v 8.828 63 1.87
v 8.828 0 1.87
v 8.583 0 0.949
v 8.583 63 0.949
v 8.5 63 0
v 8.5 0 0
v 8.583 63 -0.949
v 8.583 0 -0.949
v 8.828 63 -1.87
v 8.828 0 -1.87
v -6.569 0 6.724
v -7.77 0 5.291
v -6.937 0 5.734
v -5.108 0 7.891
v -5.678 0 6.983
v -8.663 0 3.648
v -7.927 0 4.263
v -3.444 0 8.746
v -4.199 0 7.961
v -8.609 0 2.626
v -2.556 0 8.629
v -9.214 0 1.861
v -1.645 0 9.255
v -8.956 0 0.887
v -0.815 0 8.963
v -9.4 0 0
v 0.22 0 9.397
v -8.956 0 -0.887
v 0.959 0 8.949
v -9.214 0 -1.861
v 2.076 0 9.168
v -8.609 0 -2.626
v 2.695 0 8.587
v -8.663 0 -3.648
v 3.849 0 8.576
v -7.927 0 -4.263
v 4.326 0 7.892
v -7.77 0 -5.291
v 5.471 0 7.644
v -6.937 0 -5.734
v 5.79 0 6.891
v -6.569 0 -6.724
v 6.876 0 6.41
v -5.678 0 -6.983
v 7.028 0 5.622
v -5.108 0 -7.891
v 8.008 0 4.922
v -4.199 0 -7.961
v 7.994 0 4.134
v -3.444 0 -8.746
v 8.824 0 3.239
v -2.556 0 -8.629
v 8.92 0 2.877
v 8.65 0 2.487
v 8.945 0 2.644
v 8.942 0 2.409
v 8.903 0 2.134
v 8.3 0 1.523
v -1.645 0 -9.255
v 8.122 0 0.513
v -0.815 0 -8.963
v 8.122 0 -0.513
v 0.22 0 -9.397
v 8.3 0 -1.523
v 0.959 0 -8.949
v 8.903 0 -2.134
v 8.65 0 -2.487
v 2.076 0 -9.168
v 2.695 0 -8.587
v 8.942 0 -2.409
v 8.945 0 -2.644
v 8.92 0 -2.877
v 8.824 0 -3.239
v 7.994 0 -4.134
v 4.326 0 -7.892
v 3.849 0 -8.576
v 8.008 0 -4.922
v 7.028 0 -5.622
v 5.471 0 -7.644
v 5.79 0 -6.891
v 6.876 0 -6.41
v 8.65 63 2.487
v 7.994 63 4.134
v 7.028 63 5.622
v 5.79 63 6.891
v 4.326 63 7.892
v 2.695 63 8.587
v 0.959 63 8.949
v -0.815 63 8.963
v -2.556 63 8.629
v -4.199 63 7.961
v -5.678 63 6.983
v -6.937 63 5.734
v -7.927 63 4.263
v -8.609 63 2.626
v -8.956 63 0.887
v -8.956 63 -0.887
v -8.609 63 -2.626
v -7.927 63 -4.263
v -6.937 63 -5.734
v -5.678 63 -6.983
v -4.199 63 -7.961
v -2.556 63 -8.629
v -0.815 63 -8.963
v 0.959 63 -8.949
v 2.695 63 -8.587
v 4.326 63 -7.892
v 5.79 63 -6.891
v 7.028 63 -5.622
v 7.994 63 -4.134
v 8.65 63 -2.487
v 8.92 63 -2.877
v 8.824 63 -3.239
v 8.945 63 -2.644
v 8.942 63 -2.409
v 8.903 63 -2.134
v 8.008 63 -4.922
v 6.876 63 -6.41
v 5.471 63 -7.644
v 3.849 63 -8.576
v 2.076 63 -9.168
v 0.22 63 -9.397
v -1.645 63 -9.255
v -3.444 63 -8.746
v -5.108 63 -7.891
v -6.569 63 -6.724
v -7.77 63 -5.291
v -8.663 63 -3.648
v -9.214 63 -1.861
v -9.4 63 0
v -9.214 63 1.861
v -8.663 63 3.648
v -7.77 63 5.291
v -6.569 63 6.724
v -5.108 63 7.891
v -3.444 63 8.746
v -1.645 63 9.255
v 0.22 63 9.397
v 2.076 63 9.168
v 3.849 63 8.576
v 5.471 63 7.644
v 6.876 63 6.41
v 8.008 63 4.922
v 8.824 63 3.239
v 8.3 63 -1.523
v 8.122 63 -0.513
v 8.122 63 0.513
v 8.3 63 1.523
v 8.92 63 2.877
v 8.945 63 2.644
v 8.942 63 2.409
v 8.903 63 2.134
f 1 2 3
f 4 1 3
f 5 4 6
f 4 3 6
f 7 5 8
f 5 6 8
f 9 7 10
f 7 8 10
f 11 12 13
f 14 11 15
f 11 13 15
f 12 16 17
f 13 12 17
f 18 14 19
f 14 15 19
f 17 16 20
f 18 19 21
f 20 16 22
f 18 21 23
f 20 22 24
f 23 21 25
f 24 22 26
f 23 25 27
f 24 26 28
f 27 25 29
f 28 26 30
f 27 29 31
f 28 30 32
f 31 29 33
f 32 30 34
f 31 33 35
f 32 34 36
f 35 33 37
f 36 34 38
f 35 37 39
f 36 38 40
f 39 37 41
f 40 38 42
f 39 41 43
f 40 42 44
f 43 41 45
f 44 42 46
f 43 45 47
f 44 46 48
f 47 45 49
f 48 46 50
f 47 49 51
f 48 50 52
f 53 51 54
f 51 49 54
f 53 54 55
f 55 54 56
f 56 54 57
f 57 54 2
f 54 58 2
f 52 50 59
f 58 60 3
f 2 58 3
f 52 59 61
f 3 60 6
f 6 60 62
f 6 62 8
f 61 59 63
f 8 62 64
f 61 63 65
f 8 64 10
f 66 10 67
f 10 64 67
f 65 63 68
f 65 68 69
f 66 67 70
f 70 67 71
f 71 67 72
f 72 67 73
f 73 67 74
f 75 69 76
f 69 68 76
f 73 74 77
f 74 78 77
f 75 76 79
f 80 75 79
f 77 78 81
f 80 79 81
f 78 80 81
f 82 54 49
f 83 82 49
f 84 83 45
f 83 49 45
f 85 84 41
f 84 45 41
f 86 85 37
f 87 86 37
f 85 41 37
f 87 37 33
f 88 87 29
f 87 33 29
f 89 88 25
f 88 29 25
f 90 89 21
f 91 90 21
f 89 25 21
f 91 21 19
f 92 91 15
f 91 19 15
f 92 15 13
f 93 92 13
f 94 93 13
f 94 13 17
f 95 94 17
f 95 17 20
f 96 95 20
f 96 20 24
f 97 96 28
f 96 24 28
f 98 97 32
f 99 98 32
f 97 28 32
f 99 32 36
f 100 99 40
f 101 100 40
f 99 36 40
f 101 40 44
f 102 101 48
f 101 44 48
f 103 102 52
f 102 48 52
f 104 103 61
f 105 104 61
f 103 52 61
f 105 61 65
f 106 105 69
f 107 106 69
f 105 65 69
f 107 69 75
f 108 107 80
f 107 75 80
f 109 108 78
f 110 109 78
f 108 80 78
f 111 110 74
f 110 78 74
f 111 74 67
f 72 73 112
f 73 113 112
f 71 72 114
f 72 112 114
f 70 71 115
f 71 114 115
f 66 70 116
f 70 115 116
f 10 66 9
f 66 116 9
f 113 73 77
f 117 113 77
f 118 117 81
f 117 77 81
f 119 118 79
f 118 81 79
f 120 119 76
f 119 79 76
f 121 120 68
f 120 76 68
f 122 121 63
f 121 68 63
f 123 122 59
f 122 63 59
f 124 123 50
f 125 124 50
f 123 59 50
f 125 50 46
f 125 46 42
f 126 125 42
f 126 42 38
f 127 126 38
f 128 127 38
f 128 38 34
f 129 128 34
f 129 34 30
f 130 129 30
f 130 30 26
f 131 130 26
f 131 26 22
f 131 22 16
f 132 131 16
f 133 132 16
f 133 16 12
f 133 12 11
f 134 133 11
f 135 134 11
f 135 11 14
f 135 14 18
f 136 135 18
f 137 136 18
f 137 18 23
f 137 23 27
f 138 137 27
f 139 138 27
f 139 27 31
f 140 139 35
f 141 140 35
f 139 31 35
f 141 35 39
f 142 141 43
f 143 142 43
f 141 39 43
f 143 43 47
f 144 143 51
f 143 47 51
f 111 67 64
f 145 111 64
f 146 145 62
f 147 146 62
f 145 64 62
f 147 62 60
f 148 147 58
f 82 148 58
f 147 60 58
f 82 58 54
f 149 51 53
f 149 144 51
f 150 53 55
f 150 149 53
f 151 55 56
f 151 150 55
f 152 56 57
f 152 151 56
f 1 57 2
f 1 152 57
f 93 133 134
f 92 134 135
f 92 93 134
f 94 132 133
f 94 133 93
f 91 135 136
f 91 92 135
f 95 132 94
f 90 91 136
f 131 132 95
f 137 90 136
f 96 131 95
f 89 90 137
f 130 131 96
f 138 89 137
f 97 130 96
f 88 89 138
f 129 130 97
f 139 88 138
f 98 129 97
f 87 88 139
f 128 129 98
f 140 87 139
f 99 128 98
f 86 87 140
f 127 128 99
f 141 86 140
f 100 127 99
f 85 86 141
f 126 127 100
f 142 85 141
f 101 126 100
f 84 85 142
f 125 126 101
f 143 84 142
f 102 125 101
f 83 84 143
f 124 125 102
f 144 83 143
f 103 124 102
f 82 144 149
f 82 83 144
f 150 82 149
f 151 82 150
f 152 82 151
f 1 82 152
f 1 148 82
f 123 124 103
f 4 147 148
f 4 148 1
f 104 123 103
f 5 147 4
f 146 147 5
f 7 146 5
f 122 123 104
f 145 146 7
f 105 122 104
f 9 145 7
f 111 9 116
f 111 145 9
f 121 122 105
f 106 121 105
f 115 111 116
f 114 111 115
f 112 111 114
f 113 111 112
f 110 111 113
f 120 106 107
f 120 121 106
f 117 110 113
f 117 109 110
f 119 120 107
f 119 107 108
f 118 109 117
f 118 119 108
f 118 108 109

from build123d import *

# Parameters (mm, degrees)
BOSS_EXTRUDE1_DEPTH = 63
FILLET2_R           = 2


with BuildPart() as part:
    # Sketch1 → Boss-Extrude1 (new body)
    with BuildSketch(Plane(origin=(0, 0, 0), x_dir=(1, 0, 0), z_dir=(0, 1, 0))):
        with BuildLine():
            ThreePointArc((9.075357143, 2.44905956), (-9.4, 0), (9.075357143, -2.44905956))
            ThreePointArc((9.075357143, -2.44905956), (8.5, 0), (9.075357143, 2.44905956))
        make_face()
        with BuildLine():
            ThreePointArc((8.649642857, 2.486700312), (8.1, 0), (8.649642857, -2.486700312))
            ThreePointArc((8.649642857, -2.486700312), (-9, 0), (8.649642857, 2.486700312))
        make_face(mode=Mode.SUBTRACT)
    extrude(amount=BOSS_EXTRUDE1_DEPTH)

    # Fillet2
    fillet2_edges = [part.edges().sort_by_distance(p)[0] for p in [
        (9.075357143, 31.5, 2.44905956),
        (9.075357143, 31.5, -2.44905956),
    ]]
    fillet(fillet2_edges, radius=FILLET2_R)


solid = part.part
